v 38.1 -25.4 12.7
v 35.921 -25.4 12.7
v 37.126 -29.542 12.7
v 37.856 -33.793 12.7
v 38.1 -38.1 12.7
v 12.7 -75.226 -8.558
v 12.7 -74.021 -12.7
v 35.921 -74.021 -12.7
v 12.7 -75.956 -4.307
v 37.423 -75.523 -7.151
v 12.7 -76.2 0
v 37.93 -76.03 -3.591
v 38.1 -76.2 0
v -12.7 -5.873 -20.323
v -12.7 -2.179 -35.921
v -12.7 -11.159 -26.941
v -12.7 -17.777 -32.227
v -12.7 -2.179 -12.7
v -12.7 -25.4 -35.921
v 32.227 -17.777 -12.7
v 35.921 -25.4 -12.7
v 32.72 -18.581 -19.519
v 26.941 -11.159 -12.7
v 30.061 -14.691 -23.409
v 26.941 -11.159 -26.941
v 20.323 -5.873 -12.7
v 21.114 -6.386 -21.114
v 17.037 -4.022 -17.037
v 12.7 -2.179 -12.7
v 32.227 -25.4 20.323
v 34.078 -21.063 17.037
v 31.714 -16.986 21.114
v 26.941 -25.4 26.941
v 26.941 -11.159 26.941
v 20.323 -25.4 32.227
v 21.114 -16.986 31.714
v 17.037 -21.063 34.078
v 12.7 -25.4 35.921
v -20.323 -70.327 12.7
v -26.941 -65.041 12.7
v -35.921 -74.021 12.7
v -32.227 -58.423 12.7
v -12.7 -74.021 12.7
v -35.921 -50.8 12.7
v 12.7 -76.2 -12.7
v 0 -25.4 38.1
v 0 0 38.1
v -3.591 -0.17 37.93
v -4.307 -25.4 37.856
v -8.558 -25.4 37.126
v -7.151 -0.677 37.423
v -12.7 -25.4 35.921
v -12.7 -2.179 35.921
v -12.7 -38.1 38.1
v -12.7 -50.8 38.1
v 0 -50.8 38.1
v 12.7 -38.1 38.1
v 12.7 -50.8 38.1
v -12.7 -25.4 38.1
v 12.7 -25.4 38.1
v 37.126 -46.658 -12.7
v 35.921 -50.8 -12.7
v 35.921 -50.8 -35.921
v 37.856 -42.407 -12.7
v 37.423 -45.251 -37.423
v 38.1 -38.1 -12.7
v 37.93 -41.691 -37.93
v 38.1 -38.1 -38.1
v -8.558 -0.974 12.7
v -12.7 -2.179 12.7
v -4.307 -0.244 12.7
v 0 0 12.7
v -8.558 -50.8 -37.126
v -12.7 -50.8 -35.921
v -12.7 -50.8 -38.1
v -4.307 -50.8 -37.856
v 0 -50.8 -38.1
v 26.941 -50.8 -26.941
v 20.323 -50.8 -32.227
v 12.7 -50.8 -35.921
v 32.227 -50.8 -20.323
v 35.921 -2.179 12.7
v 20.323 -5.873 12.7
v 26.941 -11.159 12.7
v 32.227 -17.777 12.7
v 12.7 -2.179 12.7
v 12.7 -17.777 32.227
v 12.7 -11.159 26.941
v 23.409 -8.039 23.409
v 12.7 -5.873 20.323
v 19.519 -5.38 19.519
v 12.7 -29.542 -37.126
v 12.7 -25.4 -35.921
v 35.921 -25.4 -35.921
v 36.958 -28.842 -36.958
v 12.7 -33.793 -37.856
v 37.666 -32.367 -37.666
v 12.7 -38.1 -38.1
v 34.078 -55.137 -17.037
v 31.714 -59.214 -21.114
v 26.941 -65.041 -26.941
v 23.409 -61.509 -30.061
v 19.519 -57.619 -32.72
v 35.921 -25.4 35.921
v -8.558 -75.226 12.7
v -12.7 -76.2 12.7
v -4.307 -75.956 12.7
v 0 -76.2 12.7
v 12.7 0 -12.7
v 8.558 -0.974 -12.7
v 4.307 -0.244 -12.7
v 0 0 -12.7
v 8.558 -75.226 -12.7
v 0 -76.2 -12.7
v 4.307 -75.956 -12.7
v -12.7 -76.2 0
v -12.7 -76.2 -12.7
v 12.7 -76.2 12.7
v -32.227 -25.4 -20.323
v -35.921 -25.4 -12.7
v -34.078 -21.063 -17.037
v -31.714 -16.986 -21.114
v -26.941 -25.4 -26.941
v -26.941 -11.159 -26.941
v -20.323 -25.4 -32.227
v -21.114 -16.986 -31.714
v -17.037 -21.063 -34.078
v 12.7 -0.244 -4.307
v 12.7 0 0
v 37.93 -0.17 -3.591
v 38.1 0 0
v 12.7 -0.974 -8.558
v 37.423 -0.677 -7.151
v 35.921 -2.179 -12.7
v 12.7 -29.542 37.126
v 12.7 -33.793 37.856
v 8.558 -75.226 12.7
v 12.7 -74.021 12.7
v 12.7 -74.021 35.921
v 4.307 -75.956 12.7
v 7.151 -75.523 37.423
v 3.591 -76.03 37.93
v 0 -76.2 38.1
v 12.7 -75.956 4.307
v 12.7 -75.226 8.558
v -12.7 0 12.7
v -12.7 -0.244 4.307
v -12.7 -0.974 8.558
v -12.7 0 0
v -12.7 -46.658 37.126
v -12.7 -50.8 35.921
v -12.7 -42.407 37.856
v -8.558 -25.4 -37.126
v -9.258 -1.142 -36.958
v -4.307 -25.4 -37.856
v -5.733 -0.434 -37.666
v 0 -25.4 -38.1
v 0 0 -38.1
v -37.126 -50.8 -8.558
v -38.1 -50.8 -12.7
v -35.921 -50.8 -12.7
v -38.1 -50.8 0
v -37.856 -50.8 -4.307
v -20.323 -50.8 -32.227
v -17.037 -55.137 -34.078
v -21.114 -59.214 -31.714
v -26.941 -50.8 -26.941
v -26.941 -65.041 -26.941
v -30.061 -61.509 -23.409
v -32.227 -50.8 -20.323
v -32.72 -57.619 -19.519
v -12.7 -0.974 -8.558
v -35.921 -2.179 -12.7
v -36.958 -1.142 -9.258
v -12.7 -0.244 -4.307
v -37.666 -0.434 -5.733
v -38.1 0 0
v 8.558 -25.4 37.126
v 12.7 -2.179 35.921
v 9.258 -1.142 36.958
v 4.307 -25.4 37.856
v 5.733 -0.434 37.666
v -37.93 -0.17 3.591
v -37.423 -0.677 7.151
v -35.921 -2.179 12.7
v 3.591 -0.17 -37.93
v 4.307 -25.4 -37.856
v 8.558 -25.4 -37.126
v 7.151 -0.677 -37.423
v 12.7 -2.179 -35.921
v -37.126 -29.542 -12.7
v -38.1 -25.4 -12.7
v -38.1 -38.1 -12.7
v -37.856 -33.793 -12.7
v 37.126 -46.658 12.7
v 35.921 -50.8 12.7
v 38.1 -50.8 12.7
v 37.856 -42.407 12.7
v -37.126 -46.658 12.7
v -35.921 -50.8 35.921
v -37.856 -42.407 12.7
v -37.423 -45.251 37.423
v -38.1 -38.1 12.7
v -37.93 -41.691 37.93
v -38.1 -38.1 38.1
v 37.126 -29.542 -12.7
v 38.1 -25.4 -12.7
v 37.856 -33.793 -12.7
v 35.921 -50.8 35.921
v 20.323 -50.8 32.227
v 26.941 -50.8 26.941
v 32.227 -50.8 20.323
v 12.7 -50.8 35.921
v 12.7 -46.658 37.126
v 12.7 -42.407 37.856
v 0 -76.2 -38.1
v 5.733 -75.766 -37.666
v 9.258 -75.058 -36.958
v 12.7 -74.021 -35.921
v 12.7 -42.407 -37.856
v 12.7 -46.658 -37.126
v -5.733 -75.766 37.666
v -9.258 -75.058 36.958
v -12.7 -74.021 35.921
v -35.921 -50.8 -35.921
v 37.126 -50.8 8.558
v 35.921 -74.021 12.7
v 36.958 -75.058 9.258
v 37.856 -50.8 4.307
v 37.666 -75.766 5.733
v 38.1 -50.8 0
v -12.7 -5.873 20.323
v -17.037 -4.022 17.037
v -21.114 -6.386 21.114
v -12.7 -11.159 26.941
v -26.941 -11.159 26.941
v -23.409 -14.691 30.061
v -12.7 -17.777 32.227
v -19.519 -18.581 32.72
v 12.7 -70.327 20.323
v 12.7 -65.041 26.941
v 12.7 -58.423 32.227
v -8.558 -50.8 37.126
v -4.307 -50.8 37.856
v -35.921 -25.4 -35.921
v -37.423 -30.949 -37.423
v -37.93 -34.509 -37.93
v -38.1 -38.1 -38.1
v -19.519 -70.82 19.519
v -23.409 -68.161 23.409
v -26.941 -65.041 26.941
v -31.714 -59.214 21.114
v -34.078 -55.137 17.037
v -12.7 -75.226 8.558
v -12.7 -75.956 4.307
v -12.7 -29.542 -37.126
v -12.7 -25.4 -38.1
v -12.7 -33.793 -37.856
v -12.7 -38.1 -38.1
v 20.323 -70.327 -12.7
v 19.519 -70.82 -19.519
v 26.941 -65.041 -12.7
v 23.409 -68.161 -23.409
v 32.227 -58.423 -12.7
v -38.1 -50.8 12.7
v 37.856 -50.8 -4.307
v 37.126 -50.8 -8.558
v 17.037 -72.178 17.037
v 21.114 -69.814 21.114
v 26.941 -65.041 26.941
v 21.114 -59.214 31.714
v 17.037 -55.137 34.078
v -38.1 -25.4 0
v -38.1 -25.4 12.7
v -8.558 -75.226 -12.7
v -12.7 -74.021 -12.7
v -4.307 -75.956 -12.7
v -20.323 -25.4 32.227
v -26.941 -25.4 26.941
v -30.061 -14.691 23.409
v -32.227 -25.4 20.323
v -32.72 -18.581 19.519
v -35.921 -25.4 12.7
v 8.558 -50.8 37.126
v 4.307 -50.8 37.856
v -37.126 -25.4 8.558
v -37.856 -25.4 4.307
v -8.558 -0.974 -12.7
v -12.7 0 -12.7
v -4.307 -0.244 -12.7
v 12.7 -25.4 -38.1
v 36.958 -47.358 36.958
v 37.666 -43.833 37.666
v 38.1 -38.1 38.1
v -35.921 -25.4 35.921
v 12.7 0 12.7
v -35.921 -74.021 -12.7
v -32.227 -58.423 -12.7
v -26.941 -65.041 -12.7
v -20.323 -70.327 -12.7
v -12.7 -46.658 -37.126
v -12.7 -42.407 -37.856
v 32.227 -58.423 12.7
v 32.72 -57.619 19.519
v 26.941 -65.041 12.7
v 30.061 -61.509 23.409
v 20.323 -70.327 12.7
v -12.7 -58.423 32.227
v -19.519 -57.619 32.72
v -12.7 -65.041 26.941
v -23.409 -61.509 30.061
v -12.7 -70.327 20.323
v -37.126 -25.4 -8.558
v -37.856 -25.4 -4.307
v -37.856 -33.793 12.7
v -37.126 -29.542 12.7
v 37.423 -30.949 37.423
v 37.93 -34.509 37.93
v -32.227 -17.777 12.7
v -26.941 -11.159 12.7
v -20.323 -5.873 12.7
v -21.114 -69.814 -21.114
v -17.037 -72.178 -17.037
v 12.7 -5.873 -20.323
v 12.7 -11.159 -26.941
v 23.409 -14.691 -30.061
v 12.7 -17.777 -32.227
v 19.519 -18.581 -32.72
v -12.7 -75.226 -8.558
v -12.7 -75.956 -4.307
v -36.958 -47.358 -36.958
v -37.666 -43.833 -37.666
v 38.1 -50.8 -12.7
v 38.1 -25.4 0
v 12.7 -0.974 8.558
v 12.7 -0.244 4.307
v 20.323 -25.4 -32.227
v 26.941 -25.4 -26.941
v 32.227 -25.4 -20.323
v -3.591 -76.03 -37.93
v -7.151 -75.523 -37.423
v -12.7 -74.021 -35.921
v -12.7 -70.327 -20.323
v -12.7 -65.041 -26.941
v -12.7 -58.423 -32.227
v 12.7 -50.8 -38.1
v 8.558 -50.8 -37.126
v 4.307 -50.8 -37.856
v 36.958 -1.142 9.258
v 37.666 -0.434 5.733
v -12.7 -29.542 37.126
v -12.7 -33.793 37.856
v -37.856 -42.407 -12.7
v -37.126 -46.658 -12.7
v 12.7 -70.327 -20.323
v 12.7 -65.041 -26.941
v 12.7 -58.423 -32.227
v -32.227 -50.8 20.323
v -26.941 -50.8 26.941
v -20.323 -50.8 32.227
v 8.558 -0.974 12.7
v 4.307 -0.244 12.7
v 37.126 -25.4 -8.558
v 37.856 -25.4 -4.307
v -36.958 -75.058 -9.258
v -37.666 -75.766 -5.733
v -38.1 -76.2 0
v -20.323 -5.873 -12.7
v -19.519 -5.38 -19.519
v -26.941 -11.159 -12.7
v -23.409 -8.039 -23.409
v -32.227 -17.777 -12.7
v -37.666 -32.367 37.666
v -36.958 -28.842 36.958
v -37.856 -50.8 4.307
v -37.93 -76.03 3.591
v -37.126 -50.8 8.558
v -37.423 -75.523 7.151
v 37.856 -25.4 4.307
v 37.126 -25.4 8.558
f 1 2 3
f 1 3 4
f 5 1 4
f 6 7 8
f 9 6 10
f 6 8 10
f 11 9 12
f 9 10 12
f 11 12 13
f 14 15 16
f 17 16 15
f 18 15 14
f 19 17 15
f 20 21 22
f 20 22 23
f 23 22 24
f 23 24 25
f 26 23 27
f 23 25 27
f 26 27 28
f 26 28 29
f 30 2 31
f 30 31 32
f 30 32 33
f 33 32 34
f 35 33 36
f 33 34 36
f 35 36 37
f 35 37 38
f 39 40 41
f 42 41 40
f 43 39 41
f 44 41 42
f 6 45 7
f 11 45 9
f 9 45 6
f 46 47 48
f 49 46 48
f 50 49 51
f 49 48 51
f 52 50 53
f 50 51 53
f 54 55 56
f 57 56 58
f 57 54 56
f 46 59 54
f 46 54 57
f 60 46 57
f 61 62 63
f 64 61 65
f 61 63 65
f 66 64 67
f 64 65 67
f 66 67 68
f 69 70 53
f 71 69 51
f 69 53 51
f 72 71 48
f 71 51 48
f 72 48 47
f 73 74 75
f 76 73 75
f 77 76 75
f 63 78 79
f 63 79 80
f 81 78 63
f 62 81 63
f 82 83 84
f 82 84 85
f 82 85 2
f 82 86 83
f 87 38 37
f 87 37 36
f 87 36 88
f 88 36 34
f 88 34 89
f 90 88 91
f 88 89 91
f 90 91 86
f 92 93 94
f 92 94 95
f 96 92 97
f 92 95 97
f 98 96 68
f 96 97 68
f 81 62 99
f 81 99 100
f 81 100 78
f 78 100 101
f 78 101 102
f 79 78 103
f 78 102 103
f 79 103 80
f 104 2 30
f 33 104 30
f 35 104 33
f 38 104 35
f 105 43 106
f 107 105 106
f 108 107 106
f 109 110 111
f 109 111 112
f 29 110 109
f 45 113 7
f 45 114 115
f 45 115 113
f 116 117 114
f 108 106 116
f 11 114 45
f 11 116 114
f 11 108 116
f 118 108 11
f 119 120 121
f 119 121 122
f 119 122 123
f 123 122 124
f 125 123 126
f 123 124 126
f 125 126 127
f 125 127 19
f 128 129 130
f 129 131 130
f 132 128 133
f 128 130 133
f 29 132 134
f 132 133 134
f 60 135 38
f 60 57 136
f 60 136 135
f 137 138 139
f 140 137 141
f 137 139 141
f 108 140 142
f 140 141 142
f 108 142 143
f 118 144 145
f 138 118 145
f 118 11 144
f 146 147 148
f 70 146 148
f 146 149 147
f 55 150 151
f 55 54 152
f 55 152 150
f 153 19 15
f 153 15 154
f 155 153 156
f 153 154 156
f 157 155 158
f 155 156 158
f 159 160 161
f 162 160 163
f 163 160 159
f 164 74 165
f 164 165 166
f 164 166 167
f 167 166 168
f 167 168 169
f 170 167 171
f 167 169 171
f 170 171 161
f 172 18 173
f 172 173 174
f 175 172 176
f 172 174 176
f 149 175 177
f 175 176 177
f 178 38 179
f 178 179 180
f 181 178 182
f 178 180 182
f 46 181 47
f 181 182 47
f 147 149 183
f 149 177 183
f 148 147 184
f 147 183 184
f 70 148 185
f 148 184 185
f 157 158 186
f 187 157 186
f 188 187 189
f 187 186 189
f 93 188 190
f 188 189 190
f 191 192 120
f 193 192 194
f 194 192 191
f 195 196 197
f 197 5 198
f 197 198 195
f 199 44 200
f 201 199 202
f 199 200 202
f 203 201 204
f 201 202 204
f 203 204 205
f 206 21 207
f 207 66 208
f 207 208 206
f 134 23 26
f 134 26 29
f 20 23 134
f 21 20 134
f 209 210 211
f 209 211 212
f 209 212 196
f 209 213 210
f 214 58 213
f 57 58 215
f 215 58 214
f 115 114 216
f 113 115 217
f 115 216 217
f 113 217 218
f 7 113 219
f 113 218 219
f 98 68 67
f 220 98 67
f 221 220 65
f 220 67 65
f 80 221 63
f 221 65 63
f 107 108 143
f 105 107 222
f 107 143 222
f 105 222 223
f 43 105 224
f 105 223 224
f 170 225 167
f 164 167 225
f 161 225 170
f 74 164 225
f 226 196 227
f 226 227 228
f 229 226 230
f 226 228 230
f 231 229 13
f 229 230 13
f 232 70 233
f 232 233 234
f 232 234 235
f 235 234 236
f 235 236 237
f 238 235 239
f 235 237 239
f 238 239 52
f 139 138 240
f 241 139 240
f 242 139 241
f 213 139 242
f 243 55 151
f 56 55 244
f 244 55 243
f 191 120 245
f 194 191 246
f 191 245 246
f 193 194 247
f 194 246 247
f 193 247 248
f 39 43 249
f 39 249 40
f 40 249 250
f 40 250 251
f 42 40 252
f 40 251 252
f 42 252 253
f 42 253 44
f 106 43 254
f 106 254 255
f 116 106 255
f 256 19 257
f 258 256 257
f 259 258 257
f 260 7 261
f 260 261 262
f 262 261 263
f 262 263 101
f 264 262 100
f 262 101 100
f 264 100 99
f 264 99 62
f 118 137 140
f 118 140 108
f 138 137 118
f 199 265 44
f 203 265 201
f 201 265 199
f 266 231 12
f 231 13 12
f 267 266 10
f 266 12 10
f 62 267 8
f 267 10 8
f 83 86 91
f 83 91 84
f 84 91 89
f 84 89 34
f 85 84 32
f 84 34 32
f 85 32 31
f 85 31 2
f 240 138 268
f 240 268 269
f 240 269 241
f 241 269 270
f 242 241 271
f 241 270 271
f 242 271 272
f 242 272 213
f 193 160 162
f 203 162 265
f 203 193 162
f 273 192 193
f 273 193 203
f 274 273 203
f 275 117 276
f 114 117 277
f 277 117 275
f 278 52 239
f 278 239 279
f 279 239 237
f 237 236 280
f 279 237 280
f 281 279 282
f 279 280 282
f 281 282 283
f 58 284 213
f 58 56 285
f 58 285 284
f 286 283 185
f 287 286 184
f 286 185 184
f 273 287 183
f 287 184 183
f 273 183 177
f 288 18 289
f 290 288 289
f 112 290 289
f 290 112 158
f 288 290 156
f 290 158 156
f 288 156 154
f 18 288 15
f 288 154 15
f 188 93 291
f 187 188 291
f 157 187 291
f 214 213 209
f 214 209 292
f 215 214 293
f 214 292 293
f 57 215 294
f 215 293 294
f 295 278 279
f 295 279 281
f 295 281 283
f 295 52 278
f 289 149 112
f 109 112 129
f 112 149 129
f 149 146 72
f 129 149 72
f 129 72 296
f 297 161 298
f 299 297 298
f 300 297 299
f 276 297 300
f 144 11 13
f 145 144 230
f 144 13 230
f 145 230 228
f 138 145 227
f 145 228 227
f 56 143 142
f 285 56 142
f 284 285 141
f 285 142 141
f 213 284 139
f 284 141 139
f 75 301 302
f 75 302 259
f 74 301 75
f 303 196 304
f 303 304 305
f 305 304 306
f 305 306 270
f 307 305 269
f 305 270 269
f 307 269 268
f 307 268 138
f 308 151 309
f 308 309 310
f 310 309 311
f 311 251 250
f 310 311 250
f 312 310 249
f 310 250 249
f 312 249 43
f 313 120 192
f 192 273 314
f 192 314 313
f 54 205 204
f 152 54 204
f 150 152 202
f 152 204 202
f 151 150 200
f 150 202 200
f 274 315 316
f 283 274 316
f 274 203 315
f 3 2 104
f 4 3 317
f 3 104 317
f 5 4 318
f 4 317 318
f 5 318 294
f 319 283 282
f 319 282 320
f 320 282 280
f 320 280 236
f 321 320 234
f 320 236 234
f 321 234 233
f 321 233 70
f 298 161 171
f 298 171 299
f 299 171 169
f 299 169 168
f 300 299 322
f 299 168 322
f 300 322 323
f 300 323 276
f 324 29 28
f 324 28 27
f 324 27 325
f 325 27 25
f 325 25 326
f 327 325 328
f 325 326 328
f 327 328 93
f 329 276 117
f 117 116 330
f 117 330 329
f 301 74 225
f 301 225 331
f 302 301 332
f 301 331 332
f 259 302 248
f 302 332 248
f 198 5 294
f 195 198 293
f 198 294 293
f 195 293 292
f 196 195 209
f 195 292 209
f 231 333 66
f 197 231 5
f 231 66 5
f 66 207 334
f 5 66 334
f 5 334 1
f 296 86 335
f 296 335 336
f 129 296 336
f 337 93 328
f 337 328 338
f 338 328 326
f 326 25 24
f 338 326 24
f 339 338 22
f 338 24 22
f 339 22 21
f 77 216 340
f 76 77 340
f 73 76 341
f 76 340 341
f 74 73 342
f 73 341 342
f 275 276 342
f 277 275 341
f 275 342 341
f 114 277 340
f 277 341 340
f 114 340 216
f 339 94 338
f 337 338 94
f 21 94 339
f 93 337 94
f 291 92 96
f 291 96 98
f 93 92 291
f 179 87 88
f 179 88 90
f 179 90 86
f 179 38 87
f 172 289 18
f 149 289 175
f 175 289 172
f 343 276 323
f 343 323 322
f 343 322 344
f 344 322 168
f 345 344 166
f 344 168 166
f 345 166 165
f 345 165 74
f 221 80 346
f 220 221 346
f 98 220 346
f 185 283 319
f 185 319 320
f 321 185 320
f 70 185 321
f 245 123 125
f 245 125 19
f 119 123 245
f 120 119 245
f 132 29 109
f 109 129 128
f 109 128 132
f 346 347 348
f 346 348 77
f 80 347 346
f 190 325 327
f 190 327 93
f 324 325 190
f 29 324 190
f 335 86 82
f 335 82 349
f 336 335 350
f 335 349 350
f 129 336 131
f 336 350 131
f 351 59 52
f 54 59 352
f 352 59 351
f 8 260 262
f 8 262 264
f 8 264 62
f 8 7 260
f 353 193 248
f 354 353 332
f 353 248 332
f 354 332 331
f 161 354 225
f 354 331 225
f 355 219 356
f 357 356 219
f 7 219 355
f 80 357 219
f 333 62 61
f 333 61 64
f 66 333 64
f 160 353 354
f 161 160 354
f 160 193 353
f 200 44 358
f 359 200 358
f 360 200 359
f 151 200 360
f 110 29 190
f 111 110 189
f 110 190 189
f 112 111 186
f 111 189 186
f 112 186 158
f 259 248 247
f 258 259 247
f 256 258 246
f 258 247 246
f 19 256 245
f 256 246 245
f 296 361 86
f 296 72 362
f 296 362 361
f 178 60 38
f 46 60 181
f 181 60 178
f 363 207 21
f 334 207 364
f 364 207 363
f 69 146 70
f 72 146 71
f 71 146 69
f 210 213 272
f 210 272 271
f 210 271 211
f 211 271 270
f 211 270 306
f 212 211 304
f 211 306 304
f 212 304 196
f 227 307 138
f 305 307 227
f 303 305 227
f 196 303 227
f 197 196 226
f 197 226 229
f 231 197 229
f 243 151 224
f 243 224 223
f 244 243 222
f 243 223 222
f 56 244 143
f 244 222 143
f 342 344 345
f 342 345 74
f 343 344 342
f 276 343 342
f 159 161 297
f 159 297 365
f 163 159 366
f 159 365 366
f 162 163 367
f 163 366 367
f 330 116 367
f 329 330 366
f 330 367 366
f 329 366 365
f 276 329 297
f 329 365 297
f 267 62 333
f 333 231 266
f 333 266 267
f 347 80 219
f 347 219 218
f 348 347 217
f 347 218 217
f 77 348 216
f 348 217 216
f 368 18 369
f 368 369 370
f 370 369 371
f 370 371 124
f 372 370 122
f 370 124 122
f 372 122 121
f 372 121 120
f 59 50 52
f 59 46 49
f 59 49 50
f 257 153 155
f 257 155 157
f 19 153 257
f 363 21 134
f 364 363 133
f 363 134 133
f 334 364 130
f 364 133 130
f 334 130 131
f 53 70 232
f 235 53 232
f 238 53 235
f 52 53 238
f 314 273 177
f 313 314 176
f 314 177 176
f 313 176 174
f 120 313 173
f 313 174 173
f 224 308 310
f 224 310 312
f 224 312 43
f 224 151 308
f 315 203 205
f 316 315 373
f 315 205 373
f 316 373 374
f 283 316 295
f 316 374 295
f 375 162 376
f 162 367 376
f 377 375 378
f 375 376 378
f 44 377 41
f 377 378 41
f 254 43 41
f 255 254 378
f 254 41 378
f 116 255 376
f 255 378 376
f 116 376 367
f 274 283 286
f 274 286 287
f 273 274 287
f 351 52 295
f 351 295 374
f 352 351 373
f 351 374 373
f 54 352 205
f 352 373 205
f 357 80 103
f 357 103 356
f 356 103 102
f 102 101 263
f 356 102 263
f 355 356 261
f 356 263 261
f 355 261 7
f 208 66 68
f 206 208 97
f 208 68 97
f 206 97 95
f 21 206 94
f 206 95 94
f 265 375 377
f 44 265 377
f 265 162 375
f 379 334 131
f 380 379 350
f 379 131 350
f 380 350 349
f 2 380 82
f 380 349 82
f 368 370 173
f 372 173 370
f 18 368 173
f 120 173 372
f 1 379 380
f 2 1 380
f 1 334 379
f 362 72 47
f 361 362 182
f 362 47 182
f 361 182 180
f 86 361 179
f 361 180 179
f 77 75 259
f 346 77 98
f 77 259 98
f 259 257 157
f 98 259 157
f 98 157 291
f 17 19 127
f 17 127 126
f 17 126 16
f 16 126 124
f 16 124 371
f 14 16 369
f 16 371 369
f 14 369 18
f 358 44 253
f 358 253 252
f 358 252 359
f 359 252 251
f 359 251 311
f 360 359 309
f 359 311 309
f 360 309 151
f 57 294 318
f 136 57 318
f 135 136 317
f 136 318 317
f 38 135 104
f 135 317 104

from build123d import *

# Parameters (mm, degrees)
F0_W      = 76.2
F0_H      = 76.2
F1_DEPTH  = 76.2
F4_DEPTH  = 76.2
F5_DEPTH  = 76.2
F8_DEPTH  = 76.2
F9_DEPTH  = 76.2
F11_DEPTH = 76.2
F13_DEPTH = 76.2
F14_DEPTH = 25.4
F15_DEPTH = 25.4
F16_DEPTH = 25.4
F17_DEPTH = 25.4
F18_DEPTH = 25.4
F19_DEPTH = 25.4
F20_DEPTH = 25.4
F21_DEPTH = 25.4
F22_DEPTH = 25.4


with BuildPart() as f1:
    # F0 (on Front) → F1 (new body)
    with BuildSketch(Plane.XZ):
        Rectangle(F0_W, F0_H)
    extrude(amount=F1_DEPTH)

    # F2 (on face) → F4 (join)
    with BuildSketch(Plane.XZ.offset(76.2)):
        with BuildLine():
            ThreePointArc((0, -38.1), (26.9407683632, -26.9407683632), (38.1, 0))
            ThreePointArc((38.1, 0), (26.9407683632, 26.9407683632), (0, 38.1))
            ThreePointArc((0, 38.1), (-26.9407683632, 26.9407683632), (-38.1, 0))
            ThreePointArc((-38.1, 0), (-26.9407683632, -26.9407683632), (0, -38.1))
        make_face()
    extrude(amount=-F4_DEPTH)

    # F3 (on face) → F5 (join)
    with BuildSketch(Plane.YZ.offset(38.1)):
        with BuildLine():
            ThreePointArc((-38.1, -38.1), (-11.1592316368, -26.9407683632), (0, 0))
            ThreePointArc((0, 0), (-11.1592316368, 26.9407683632), (-38.1, 38.1))
            ThreePointArc((-38.1, 38.1), (-65.0407683632, 26.9407683632), (-76.2, 0))
            ThreePointArc((-76.2, 0), (-65.0407683632, -26.9407683632), (-38.1, -38.1))
        make_face()
    extrude(amount=-F5_DEPTH)

    # F7 (on face) → F8 (join)
    with BuildSketch(Plane(origin=(0, 0, 0), x_dir=(-1, 0, 0), z_dir=(0, 1, 0))):
        with BuildLine():
            ThreePointArc((0, -38.1), (26.9407683632, -26.9407683632), (38.1, 0))
            ThreePointArc((38.1, 0), (26.9407683632, 26.9407683632), (0, 38.1))
            ThreePointArc((0, 38.1), (-26.9407683632, 26.9407683632), (-38.1, 0))
            ThreePointArc((-38.1, 0), (-26.9407683632, -26.9407683632), (0, -38.1))
        make_face()
    extrude(amount=-F8_DEPTH)



with BuildPart() as f9:
    # F6 (on face) → F9 (new body)
    with BuildSketch(Plane(origin=(-38.1, 0, 0), x_dir=(0, -1, 0), z_dir=(-1, 0, 0))):
        with BuildLine():
            ThreePointArc((38.1, -38.1), (65.0407683632, -26.9407683632), (76.2, 0))
            ThreePointArc((76.2, 0), (65.0407683632, 26.9407683632), (38.1, 38.1))
            ThreePointArc((38.1, 38.1), (11.1592316368, 26.9407683632), (0, 0))
            ThreePointArc((0, 0), (11.1592316368, -26.9407683632), (38.1, -38.1))
        make_face()
    extrude(amount=-F9_DEPTH)


with BuildPart() as f1_1:
    add(f1.part)

    add(f9.part)  # F11 merges F9
    # F10 (on face) → F11 (join)
    with BuildSketch(Plane.XY.offset(38.1)):
        with BuildLine():
            ThreePointArc((0, -76.2), (26.9407683632, -65.0407683632), (38.1, -38.1))
            ThreePointArc((38.1, -38.1), (26.9407683839, -11.1592316575), (5.86e-08, 0))
            ThreePointArc((5.86e-08, 0), (-26.9407683425, -11.1592316161), (-38.1, -38.1))
            ThreePointArc((-38.1, -38.1), (-26.9407683632, -65.0407683632), (0, -76.2))
        make_face()
    extrude(amount=-F11_DEPTH)

    # F12 (on face) → F13 (join)
    with BuildSketch(Plane(origin=(0, 0, -38.1), x_dir=(1, 0, 0), z_dir=(0, 0, -1))):
        with BuildLine():
            ThreePointArc((8.43e-08, 0), (26.940768393, 11.1592316666), (38.1, 38.1))
            ThreePointArc((38.1, 38.1), (26.9407683632, 65.0407683632), (0, 76.2))
            ThreePointArc((0, 76.2), (-26.9407683632, 65.0407683632), (-38.1, 38.1))
            ThreePointArc((-38.1, 38.1), (-26.9407683334, 11.159231607), (8.43e-08, 0))
        make_face()
    extrude(amount=-F13_DEPTH)

    # F2 (on face) → F14 (cut)
    with BuildSketch(Plane.XZ.offset(76.2)):
        with BuildLine():
            ThreePointArc((0, 38.1), (26.9407683632, 26.9407683632), (38.1, 0))
            Line((38.1, 0), (38.1, 38.1))
            Line((38.1, 38.1), (0, 38.1))
        make_face()
    extrude(amount=-F14_DEPTH, mode=Mode.SUBTRACT)

    # F2 (on face) → F15 (cut)
    with BuildSketch(Plane.XZ.offset(76.2)):
        with BuildLine():
            ThreePointArc((-38.1, 0), (-26.9407683632, 26.9407683632), (0, 38.1))
            Line((0, 38.1), (-38.1, 38.1))
            Line((-38.1, 38.1), (-38.1, 0))
        make_face()
    extrude(amount=-F15_DEPTH, mode=Mode.SUBTRACT)

    # F2 (on face) → F16 (cut)
    with BuildSketch(Plane.XZ.offset(76.2)):
        with BuildLine():
            Line((38.1, -38.1), (38.1, 0))
            ThreePointArc((38.1, 0), (26.9407683632, -26.9407683632), (0, -38.1))
            Line((0, -38.1), (38.1, -38.1))
        make_face()
        with BuildLine():
            Line((-38.1, -38.1), (0, -38.1))
            ThreePointArc((0, -38.1), (-26.9407683632, -26.9407683632), (-38.1, 0))
            Line((-38.1, 0), (-38.1, -38.1))
        make_face()
    extrude(amount=-F16_DEPTH, mode=Mode.SUBTRACT)

    # F3 (on face) → F17 (cut)
    with BuildSketch(Plane.YZ.offset(38.1)):
        with BuildLine():
            ThreePointArc((-76.2, 0), (-65.0407683632, 26.9407683632), (-38.1, 38.1))
            Line((-38.1, 38.1), (-76.2, 38.1))
            Line((-76.2, 38.1), (-76.2, 0))
        make_face()
    extrude(amount=-F17_DEPTH, mode=Mode.SUBTRACT)

    # F3 (on face) → F18 (cut)
    with BuildSketch(Plane.YZ.offset(38.1)):
        with BuildLine():
            ThreePointArc((-38.1, 38.1), (-11.1592316368, 26.9407683632), (0, 0))
            Line((0, 0), (0, 38.1))
            Line((0, 38.1), (-38.1, 38.1))
        make_face()
        with BuildLine():
            Line((0, -38.1), (0, 0))
            ThreePointArc((0, 0), (-11.1592316368, -26.9407683632), (-38.1, -38.1))
            Line((-38.1, -38.1), (0, -38.1))
        make_face()
        with BuildLine():
            Line((-76.2, -38.1), (-38.1, -38.1))
            ThreePointArc((-38.1, -38.1), (-65.0407683632, -26.9407683632), (-76.2, 0))
            Line((-76.2, 0), (-76.2, -38.1))
        make_face()
        with BuildLine():
            ThreePointArc((-76.2, 0), (-65.0407683632, 26.9407683632), (-38.1, 38.1))
            Line((-38.1, 38.1), (-76.2, 38.1))
            Line((-76.2, 38.1), (-76.2, 0))
        make_face()
    extrude(amount=-F18_DEPTH, mode=Mode.SUBTRACT)

    # F6 (on face) → F19 (cut)
    with BuildSketch(Plane(origin=(-38.1, 0, 0), x_dir=(0, -1, 0), z_dir=(-1, 0, 0))):
        with BuildLine():
            ThreePointArc((0, 0), (11.1592316368, 26.9407683632), (38.1, 38.1))
            Line((38.1, 38.1), (0, 38.1))
            Line((0, 38.1), (0, 0))
        make_face()
        with BuildLine():
            ThreePointArc((38.1, 38.1), (65.0407683632, 26.9407683632), (76.2, 0))
            Line((76.2, 0), (76.2, 38.1))
            Line((76.2, 38.1), (38.1, 38.1))
        make_face()
        with BuildLine():
            Line((76.2, -38.1), (76.2, 0))
            ThreePointArc((76.2, 0), (65.0407683632, -26.9407683632), (38.1, -38.1))
            Line((38.1, -38.1), (76.2, -38.1))
        make_face()
        with BuildLine():
            Line((0, -38.1), (38.1, -38.1))
            ThreePointArc((38.1, -38.1), (11.1592316368, -26.9407683632), (0, 0))
            Line((0, 0), (0, -38.1))
        make_face()
    extrude(amount=-F19_DEPTH, mode=Mode.SUBTRACT)

    # F7 (on face) → F20 (cut)
    with BuildSketch(Plane(origin=(0, 0, 0), x_dir=(-1, 0, 0), z_dir=(0, 1, 0))):
        with BuildLine():
            ThreePointArc((-38.1, 0), (-26.9407683632, 26.9407683632), (0, 38.1))
            Line((0, 38.1), (-38.1, 38.1))
            Line((-38.1, 38.1), (-38.1, 0))
        make_face()
        with BuildLine():
            ThreePointArc((0, 38.1), (26.9407683632, 26.9407683632), (38.1, 0))
            Line((38.1, 0), (38.1, 38.1))
            Line((38.1, 38.1), (0, 38.1))
        make_face()
        with BuildLine():
            Line((38.1, -38.1), (38.1, 0))
            ThreePointArc((38.1, 0), (26.9407683632, -26.9407683632), (0, -38.1))
            Line((0, -38.1), (38.1, -38.1))
        make_face()
        with BuildLine():
            Line((-38.1, -38.1), (0, -38.1))
            ThreePointArc((0, -38.1), (-26.9407683632, -26.9407683632), (-38.1, 0))
            Line((-38.1, 0), (-38.1, -38.1))
        make_face()
    extrude(amount=-F20_DEPTH, mode=Mode.SUBTRACT)

    # F10 (on face) → F21 (cut)
    with BuildSketch(Plane.XY.offset(38.1)):
        with BuildLine():
            ThreePointArc((5.86e-08, 0), (26.9407683839, -11.1592316575), (38.1, -38.1))
            Line((38.1, -38.1), (38.1, 0))
            Line((38.1, 0), (5.86e-08, 0))
        make_face()
        with BuildLine():
            Line((38.1, -76.2), (38.1, -38.1))
            ThreePointArc((38.1, -38.1), (26.9407683632, -65.0407683632), (0, -76.2))
            Line((0, -76.2), (38.1, -76.2))
        make_face()
        with BuildLine():
            Line((-38.1, -76.2), (0, -76.2))
            ThreePointArc((0, -76.2), (-26.9407683632, -65.0407683632), (-38.1, -38.1))
            Line((-38.1, -38.1), (-38.1, -76.2))
        make_face()
        with BuildLine():
            ThreePointArc((-38.1, -38.1), (-26.9407683425, -11.1592316161), (5.86e-08, 0))
            Line((5.86e-08, 0), (-38.1, 0))
            Line((-38.1, 0), (-38.1, -38.1))
        make_face()
    extrude(amount=-F21_DEPTH, mode=Mode.SUBTRACT)

    # F12 (on face) → F22 (cut)
    with BuildSketch(Plane(origin=(0, 0, -38.1), x_dir=(1, 0, 0), z_dir=(0, 0, -1))):
        with BuildLine():
            Line((-38.1, 0), (8.43e-08, 0))
            ThreePointArc((8.43e-08, 0), (-26.9407683334, 11.159231607), (-38.1, 38.1))
            Line((-38.1, 38.1), (-38.1, 0))
        make_face()
        with BuildLine():
            ThreePointArc((-38.1, 38.1), (-26.9407683632, 65.0407683632), (0, 76.2))
            Line((0, 76.2), (-38.1, 76.2))
            Line((-38.1, 76.2), (-38.1, 38.1))
        make_face()
        with BuildLine():
            ThreePointArc((0, 76.2), (26.9407683632, 65.0407683632), (38.1, 38.1))
            Line((38.1, 38.1), (38.1, 76.2))
            Line((38.1, 76.2), (0, 76.2))
        make_face()
        with BuildLine():
            Line((38.1, 0), (38.1, 38.1))
            ThreePointArc((38.1, 38.1), (26.940768393, 11.1592316666), (8.43e-08, 0))
            Line((8.43e-08, 0), (38.1, 0))
        make_face()
    extrude(amount=-F22_DEPTH, mode=Mode.SUBTRACT)


solid = f1_1.part
